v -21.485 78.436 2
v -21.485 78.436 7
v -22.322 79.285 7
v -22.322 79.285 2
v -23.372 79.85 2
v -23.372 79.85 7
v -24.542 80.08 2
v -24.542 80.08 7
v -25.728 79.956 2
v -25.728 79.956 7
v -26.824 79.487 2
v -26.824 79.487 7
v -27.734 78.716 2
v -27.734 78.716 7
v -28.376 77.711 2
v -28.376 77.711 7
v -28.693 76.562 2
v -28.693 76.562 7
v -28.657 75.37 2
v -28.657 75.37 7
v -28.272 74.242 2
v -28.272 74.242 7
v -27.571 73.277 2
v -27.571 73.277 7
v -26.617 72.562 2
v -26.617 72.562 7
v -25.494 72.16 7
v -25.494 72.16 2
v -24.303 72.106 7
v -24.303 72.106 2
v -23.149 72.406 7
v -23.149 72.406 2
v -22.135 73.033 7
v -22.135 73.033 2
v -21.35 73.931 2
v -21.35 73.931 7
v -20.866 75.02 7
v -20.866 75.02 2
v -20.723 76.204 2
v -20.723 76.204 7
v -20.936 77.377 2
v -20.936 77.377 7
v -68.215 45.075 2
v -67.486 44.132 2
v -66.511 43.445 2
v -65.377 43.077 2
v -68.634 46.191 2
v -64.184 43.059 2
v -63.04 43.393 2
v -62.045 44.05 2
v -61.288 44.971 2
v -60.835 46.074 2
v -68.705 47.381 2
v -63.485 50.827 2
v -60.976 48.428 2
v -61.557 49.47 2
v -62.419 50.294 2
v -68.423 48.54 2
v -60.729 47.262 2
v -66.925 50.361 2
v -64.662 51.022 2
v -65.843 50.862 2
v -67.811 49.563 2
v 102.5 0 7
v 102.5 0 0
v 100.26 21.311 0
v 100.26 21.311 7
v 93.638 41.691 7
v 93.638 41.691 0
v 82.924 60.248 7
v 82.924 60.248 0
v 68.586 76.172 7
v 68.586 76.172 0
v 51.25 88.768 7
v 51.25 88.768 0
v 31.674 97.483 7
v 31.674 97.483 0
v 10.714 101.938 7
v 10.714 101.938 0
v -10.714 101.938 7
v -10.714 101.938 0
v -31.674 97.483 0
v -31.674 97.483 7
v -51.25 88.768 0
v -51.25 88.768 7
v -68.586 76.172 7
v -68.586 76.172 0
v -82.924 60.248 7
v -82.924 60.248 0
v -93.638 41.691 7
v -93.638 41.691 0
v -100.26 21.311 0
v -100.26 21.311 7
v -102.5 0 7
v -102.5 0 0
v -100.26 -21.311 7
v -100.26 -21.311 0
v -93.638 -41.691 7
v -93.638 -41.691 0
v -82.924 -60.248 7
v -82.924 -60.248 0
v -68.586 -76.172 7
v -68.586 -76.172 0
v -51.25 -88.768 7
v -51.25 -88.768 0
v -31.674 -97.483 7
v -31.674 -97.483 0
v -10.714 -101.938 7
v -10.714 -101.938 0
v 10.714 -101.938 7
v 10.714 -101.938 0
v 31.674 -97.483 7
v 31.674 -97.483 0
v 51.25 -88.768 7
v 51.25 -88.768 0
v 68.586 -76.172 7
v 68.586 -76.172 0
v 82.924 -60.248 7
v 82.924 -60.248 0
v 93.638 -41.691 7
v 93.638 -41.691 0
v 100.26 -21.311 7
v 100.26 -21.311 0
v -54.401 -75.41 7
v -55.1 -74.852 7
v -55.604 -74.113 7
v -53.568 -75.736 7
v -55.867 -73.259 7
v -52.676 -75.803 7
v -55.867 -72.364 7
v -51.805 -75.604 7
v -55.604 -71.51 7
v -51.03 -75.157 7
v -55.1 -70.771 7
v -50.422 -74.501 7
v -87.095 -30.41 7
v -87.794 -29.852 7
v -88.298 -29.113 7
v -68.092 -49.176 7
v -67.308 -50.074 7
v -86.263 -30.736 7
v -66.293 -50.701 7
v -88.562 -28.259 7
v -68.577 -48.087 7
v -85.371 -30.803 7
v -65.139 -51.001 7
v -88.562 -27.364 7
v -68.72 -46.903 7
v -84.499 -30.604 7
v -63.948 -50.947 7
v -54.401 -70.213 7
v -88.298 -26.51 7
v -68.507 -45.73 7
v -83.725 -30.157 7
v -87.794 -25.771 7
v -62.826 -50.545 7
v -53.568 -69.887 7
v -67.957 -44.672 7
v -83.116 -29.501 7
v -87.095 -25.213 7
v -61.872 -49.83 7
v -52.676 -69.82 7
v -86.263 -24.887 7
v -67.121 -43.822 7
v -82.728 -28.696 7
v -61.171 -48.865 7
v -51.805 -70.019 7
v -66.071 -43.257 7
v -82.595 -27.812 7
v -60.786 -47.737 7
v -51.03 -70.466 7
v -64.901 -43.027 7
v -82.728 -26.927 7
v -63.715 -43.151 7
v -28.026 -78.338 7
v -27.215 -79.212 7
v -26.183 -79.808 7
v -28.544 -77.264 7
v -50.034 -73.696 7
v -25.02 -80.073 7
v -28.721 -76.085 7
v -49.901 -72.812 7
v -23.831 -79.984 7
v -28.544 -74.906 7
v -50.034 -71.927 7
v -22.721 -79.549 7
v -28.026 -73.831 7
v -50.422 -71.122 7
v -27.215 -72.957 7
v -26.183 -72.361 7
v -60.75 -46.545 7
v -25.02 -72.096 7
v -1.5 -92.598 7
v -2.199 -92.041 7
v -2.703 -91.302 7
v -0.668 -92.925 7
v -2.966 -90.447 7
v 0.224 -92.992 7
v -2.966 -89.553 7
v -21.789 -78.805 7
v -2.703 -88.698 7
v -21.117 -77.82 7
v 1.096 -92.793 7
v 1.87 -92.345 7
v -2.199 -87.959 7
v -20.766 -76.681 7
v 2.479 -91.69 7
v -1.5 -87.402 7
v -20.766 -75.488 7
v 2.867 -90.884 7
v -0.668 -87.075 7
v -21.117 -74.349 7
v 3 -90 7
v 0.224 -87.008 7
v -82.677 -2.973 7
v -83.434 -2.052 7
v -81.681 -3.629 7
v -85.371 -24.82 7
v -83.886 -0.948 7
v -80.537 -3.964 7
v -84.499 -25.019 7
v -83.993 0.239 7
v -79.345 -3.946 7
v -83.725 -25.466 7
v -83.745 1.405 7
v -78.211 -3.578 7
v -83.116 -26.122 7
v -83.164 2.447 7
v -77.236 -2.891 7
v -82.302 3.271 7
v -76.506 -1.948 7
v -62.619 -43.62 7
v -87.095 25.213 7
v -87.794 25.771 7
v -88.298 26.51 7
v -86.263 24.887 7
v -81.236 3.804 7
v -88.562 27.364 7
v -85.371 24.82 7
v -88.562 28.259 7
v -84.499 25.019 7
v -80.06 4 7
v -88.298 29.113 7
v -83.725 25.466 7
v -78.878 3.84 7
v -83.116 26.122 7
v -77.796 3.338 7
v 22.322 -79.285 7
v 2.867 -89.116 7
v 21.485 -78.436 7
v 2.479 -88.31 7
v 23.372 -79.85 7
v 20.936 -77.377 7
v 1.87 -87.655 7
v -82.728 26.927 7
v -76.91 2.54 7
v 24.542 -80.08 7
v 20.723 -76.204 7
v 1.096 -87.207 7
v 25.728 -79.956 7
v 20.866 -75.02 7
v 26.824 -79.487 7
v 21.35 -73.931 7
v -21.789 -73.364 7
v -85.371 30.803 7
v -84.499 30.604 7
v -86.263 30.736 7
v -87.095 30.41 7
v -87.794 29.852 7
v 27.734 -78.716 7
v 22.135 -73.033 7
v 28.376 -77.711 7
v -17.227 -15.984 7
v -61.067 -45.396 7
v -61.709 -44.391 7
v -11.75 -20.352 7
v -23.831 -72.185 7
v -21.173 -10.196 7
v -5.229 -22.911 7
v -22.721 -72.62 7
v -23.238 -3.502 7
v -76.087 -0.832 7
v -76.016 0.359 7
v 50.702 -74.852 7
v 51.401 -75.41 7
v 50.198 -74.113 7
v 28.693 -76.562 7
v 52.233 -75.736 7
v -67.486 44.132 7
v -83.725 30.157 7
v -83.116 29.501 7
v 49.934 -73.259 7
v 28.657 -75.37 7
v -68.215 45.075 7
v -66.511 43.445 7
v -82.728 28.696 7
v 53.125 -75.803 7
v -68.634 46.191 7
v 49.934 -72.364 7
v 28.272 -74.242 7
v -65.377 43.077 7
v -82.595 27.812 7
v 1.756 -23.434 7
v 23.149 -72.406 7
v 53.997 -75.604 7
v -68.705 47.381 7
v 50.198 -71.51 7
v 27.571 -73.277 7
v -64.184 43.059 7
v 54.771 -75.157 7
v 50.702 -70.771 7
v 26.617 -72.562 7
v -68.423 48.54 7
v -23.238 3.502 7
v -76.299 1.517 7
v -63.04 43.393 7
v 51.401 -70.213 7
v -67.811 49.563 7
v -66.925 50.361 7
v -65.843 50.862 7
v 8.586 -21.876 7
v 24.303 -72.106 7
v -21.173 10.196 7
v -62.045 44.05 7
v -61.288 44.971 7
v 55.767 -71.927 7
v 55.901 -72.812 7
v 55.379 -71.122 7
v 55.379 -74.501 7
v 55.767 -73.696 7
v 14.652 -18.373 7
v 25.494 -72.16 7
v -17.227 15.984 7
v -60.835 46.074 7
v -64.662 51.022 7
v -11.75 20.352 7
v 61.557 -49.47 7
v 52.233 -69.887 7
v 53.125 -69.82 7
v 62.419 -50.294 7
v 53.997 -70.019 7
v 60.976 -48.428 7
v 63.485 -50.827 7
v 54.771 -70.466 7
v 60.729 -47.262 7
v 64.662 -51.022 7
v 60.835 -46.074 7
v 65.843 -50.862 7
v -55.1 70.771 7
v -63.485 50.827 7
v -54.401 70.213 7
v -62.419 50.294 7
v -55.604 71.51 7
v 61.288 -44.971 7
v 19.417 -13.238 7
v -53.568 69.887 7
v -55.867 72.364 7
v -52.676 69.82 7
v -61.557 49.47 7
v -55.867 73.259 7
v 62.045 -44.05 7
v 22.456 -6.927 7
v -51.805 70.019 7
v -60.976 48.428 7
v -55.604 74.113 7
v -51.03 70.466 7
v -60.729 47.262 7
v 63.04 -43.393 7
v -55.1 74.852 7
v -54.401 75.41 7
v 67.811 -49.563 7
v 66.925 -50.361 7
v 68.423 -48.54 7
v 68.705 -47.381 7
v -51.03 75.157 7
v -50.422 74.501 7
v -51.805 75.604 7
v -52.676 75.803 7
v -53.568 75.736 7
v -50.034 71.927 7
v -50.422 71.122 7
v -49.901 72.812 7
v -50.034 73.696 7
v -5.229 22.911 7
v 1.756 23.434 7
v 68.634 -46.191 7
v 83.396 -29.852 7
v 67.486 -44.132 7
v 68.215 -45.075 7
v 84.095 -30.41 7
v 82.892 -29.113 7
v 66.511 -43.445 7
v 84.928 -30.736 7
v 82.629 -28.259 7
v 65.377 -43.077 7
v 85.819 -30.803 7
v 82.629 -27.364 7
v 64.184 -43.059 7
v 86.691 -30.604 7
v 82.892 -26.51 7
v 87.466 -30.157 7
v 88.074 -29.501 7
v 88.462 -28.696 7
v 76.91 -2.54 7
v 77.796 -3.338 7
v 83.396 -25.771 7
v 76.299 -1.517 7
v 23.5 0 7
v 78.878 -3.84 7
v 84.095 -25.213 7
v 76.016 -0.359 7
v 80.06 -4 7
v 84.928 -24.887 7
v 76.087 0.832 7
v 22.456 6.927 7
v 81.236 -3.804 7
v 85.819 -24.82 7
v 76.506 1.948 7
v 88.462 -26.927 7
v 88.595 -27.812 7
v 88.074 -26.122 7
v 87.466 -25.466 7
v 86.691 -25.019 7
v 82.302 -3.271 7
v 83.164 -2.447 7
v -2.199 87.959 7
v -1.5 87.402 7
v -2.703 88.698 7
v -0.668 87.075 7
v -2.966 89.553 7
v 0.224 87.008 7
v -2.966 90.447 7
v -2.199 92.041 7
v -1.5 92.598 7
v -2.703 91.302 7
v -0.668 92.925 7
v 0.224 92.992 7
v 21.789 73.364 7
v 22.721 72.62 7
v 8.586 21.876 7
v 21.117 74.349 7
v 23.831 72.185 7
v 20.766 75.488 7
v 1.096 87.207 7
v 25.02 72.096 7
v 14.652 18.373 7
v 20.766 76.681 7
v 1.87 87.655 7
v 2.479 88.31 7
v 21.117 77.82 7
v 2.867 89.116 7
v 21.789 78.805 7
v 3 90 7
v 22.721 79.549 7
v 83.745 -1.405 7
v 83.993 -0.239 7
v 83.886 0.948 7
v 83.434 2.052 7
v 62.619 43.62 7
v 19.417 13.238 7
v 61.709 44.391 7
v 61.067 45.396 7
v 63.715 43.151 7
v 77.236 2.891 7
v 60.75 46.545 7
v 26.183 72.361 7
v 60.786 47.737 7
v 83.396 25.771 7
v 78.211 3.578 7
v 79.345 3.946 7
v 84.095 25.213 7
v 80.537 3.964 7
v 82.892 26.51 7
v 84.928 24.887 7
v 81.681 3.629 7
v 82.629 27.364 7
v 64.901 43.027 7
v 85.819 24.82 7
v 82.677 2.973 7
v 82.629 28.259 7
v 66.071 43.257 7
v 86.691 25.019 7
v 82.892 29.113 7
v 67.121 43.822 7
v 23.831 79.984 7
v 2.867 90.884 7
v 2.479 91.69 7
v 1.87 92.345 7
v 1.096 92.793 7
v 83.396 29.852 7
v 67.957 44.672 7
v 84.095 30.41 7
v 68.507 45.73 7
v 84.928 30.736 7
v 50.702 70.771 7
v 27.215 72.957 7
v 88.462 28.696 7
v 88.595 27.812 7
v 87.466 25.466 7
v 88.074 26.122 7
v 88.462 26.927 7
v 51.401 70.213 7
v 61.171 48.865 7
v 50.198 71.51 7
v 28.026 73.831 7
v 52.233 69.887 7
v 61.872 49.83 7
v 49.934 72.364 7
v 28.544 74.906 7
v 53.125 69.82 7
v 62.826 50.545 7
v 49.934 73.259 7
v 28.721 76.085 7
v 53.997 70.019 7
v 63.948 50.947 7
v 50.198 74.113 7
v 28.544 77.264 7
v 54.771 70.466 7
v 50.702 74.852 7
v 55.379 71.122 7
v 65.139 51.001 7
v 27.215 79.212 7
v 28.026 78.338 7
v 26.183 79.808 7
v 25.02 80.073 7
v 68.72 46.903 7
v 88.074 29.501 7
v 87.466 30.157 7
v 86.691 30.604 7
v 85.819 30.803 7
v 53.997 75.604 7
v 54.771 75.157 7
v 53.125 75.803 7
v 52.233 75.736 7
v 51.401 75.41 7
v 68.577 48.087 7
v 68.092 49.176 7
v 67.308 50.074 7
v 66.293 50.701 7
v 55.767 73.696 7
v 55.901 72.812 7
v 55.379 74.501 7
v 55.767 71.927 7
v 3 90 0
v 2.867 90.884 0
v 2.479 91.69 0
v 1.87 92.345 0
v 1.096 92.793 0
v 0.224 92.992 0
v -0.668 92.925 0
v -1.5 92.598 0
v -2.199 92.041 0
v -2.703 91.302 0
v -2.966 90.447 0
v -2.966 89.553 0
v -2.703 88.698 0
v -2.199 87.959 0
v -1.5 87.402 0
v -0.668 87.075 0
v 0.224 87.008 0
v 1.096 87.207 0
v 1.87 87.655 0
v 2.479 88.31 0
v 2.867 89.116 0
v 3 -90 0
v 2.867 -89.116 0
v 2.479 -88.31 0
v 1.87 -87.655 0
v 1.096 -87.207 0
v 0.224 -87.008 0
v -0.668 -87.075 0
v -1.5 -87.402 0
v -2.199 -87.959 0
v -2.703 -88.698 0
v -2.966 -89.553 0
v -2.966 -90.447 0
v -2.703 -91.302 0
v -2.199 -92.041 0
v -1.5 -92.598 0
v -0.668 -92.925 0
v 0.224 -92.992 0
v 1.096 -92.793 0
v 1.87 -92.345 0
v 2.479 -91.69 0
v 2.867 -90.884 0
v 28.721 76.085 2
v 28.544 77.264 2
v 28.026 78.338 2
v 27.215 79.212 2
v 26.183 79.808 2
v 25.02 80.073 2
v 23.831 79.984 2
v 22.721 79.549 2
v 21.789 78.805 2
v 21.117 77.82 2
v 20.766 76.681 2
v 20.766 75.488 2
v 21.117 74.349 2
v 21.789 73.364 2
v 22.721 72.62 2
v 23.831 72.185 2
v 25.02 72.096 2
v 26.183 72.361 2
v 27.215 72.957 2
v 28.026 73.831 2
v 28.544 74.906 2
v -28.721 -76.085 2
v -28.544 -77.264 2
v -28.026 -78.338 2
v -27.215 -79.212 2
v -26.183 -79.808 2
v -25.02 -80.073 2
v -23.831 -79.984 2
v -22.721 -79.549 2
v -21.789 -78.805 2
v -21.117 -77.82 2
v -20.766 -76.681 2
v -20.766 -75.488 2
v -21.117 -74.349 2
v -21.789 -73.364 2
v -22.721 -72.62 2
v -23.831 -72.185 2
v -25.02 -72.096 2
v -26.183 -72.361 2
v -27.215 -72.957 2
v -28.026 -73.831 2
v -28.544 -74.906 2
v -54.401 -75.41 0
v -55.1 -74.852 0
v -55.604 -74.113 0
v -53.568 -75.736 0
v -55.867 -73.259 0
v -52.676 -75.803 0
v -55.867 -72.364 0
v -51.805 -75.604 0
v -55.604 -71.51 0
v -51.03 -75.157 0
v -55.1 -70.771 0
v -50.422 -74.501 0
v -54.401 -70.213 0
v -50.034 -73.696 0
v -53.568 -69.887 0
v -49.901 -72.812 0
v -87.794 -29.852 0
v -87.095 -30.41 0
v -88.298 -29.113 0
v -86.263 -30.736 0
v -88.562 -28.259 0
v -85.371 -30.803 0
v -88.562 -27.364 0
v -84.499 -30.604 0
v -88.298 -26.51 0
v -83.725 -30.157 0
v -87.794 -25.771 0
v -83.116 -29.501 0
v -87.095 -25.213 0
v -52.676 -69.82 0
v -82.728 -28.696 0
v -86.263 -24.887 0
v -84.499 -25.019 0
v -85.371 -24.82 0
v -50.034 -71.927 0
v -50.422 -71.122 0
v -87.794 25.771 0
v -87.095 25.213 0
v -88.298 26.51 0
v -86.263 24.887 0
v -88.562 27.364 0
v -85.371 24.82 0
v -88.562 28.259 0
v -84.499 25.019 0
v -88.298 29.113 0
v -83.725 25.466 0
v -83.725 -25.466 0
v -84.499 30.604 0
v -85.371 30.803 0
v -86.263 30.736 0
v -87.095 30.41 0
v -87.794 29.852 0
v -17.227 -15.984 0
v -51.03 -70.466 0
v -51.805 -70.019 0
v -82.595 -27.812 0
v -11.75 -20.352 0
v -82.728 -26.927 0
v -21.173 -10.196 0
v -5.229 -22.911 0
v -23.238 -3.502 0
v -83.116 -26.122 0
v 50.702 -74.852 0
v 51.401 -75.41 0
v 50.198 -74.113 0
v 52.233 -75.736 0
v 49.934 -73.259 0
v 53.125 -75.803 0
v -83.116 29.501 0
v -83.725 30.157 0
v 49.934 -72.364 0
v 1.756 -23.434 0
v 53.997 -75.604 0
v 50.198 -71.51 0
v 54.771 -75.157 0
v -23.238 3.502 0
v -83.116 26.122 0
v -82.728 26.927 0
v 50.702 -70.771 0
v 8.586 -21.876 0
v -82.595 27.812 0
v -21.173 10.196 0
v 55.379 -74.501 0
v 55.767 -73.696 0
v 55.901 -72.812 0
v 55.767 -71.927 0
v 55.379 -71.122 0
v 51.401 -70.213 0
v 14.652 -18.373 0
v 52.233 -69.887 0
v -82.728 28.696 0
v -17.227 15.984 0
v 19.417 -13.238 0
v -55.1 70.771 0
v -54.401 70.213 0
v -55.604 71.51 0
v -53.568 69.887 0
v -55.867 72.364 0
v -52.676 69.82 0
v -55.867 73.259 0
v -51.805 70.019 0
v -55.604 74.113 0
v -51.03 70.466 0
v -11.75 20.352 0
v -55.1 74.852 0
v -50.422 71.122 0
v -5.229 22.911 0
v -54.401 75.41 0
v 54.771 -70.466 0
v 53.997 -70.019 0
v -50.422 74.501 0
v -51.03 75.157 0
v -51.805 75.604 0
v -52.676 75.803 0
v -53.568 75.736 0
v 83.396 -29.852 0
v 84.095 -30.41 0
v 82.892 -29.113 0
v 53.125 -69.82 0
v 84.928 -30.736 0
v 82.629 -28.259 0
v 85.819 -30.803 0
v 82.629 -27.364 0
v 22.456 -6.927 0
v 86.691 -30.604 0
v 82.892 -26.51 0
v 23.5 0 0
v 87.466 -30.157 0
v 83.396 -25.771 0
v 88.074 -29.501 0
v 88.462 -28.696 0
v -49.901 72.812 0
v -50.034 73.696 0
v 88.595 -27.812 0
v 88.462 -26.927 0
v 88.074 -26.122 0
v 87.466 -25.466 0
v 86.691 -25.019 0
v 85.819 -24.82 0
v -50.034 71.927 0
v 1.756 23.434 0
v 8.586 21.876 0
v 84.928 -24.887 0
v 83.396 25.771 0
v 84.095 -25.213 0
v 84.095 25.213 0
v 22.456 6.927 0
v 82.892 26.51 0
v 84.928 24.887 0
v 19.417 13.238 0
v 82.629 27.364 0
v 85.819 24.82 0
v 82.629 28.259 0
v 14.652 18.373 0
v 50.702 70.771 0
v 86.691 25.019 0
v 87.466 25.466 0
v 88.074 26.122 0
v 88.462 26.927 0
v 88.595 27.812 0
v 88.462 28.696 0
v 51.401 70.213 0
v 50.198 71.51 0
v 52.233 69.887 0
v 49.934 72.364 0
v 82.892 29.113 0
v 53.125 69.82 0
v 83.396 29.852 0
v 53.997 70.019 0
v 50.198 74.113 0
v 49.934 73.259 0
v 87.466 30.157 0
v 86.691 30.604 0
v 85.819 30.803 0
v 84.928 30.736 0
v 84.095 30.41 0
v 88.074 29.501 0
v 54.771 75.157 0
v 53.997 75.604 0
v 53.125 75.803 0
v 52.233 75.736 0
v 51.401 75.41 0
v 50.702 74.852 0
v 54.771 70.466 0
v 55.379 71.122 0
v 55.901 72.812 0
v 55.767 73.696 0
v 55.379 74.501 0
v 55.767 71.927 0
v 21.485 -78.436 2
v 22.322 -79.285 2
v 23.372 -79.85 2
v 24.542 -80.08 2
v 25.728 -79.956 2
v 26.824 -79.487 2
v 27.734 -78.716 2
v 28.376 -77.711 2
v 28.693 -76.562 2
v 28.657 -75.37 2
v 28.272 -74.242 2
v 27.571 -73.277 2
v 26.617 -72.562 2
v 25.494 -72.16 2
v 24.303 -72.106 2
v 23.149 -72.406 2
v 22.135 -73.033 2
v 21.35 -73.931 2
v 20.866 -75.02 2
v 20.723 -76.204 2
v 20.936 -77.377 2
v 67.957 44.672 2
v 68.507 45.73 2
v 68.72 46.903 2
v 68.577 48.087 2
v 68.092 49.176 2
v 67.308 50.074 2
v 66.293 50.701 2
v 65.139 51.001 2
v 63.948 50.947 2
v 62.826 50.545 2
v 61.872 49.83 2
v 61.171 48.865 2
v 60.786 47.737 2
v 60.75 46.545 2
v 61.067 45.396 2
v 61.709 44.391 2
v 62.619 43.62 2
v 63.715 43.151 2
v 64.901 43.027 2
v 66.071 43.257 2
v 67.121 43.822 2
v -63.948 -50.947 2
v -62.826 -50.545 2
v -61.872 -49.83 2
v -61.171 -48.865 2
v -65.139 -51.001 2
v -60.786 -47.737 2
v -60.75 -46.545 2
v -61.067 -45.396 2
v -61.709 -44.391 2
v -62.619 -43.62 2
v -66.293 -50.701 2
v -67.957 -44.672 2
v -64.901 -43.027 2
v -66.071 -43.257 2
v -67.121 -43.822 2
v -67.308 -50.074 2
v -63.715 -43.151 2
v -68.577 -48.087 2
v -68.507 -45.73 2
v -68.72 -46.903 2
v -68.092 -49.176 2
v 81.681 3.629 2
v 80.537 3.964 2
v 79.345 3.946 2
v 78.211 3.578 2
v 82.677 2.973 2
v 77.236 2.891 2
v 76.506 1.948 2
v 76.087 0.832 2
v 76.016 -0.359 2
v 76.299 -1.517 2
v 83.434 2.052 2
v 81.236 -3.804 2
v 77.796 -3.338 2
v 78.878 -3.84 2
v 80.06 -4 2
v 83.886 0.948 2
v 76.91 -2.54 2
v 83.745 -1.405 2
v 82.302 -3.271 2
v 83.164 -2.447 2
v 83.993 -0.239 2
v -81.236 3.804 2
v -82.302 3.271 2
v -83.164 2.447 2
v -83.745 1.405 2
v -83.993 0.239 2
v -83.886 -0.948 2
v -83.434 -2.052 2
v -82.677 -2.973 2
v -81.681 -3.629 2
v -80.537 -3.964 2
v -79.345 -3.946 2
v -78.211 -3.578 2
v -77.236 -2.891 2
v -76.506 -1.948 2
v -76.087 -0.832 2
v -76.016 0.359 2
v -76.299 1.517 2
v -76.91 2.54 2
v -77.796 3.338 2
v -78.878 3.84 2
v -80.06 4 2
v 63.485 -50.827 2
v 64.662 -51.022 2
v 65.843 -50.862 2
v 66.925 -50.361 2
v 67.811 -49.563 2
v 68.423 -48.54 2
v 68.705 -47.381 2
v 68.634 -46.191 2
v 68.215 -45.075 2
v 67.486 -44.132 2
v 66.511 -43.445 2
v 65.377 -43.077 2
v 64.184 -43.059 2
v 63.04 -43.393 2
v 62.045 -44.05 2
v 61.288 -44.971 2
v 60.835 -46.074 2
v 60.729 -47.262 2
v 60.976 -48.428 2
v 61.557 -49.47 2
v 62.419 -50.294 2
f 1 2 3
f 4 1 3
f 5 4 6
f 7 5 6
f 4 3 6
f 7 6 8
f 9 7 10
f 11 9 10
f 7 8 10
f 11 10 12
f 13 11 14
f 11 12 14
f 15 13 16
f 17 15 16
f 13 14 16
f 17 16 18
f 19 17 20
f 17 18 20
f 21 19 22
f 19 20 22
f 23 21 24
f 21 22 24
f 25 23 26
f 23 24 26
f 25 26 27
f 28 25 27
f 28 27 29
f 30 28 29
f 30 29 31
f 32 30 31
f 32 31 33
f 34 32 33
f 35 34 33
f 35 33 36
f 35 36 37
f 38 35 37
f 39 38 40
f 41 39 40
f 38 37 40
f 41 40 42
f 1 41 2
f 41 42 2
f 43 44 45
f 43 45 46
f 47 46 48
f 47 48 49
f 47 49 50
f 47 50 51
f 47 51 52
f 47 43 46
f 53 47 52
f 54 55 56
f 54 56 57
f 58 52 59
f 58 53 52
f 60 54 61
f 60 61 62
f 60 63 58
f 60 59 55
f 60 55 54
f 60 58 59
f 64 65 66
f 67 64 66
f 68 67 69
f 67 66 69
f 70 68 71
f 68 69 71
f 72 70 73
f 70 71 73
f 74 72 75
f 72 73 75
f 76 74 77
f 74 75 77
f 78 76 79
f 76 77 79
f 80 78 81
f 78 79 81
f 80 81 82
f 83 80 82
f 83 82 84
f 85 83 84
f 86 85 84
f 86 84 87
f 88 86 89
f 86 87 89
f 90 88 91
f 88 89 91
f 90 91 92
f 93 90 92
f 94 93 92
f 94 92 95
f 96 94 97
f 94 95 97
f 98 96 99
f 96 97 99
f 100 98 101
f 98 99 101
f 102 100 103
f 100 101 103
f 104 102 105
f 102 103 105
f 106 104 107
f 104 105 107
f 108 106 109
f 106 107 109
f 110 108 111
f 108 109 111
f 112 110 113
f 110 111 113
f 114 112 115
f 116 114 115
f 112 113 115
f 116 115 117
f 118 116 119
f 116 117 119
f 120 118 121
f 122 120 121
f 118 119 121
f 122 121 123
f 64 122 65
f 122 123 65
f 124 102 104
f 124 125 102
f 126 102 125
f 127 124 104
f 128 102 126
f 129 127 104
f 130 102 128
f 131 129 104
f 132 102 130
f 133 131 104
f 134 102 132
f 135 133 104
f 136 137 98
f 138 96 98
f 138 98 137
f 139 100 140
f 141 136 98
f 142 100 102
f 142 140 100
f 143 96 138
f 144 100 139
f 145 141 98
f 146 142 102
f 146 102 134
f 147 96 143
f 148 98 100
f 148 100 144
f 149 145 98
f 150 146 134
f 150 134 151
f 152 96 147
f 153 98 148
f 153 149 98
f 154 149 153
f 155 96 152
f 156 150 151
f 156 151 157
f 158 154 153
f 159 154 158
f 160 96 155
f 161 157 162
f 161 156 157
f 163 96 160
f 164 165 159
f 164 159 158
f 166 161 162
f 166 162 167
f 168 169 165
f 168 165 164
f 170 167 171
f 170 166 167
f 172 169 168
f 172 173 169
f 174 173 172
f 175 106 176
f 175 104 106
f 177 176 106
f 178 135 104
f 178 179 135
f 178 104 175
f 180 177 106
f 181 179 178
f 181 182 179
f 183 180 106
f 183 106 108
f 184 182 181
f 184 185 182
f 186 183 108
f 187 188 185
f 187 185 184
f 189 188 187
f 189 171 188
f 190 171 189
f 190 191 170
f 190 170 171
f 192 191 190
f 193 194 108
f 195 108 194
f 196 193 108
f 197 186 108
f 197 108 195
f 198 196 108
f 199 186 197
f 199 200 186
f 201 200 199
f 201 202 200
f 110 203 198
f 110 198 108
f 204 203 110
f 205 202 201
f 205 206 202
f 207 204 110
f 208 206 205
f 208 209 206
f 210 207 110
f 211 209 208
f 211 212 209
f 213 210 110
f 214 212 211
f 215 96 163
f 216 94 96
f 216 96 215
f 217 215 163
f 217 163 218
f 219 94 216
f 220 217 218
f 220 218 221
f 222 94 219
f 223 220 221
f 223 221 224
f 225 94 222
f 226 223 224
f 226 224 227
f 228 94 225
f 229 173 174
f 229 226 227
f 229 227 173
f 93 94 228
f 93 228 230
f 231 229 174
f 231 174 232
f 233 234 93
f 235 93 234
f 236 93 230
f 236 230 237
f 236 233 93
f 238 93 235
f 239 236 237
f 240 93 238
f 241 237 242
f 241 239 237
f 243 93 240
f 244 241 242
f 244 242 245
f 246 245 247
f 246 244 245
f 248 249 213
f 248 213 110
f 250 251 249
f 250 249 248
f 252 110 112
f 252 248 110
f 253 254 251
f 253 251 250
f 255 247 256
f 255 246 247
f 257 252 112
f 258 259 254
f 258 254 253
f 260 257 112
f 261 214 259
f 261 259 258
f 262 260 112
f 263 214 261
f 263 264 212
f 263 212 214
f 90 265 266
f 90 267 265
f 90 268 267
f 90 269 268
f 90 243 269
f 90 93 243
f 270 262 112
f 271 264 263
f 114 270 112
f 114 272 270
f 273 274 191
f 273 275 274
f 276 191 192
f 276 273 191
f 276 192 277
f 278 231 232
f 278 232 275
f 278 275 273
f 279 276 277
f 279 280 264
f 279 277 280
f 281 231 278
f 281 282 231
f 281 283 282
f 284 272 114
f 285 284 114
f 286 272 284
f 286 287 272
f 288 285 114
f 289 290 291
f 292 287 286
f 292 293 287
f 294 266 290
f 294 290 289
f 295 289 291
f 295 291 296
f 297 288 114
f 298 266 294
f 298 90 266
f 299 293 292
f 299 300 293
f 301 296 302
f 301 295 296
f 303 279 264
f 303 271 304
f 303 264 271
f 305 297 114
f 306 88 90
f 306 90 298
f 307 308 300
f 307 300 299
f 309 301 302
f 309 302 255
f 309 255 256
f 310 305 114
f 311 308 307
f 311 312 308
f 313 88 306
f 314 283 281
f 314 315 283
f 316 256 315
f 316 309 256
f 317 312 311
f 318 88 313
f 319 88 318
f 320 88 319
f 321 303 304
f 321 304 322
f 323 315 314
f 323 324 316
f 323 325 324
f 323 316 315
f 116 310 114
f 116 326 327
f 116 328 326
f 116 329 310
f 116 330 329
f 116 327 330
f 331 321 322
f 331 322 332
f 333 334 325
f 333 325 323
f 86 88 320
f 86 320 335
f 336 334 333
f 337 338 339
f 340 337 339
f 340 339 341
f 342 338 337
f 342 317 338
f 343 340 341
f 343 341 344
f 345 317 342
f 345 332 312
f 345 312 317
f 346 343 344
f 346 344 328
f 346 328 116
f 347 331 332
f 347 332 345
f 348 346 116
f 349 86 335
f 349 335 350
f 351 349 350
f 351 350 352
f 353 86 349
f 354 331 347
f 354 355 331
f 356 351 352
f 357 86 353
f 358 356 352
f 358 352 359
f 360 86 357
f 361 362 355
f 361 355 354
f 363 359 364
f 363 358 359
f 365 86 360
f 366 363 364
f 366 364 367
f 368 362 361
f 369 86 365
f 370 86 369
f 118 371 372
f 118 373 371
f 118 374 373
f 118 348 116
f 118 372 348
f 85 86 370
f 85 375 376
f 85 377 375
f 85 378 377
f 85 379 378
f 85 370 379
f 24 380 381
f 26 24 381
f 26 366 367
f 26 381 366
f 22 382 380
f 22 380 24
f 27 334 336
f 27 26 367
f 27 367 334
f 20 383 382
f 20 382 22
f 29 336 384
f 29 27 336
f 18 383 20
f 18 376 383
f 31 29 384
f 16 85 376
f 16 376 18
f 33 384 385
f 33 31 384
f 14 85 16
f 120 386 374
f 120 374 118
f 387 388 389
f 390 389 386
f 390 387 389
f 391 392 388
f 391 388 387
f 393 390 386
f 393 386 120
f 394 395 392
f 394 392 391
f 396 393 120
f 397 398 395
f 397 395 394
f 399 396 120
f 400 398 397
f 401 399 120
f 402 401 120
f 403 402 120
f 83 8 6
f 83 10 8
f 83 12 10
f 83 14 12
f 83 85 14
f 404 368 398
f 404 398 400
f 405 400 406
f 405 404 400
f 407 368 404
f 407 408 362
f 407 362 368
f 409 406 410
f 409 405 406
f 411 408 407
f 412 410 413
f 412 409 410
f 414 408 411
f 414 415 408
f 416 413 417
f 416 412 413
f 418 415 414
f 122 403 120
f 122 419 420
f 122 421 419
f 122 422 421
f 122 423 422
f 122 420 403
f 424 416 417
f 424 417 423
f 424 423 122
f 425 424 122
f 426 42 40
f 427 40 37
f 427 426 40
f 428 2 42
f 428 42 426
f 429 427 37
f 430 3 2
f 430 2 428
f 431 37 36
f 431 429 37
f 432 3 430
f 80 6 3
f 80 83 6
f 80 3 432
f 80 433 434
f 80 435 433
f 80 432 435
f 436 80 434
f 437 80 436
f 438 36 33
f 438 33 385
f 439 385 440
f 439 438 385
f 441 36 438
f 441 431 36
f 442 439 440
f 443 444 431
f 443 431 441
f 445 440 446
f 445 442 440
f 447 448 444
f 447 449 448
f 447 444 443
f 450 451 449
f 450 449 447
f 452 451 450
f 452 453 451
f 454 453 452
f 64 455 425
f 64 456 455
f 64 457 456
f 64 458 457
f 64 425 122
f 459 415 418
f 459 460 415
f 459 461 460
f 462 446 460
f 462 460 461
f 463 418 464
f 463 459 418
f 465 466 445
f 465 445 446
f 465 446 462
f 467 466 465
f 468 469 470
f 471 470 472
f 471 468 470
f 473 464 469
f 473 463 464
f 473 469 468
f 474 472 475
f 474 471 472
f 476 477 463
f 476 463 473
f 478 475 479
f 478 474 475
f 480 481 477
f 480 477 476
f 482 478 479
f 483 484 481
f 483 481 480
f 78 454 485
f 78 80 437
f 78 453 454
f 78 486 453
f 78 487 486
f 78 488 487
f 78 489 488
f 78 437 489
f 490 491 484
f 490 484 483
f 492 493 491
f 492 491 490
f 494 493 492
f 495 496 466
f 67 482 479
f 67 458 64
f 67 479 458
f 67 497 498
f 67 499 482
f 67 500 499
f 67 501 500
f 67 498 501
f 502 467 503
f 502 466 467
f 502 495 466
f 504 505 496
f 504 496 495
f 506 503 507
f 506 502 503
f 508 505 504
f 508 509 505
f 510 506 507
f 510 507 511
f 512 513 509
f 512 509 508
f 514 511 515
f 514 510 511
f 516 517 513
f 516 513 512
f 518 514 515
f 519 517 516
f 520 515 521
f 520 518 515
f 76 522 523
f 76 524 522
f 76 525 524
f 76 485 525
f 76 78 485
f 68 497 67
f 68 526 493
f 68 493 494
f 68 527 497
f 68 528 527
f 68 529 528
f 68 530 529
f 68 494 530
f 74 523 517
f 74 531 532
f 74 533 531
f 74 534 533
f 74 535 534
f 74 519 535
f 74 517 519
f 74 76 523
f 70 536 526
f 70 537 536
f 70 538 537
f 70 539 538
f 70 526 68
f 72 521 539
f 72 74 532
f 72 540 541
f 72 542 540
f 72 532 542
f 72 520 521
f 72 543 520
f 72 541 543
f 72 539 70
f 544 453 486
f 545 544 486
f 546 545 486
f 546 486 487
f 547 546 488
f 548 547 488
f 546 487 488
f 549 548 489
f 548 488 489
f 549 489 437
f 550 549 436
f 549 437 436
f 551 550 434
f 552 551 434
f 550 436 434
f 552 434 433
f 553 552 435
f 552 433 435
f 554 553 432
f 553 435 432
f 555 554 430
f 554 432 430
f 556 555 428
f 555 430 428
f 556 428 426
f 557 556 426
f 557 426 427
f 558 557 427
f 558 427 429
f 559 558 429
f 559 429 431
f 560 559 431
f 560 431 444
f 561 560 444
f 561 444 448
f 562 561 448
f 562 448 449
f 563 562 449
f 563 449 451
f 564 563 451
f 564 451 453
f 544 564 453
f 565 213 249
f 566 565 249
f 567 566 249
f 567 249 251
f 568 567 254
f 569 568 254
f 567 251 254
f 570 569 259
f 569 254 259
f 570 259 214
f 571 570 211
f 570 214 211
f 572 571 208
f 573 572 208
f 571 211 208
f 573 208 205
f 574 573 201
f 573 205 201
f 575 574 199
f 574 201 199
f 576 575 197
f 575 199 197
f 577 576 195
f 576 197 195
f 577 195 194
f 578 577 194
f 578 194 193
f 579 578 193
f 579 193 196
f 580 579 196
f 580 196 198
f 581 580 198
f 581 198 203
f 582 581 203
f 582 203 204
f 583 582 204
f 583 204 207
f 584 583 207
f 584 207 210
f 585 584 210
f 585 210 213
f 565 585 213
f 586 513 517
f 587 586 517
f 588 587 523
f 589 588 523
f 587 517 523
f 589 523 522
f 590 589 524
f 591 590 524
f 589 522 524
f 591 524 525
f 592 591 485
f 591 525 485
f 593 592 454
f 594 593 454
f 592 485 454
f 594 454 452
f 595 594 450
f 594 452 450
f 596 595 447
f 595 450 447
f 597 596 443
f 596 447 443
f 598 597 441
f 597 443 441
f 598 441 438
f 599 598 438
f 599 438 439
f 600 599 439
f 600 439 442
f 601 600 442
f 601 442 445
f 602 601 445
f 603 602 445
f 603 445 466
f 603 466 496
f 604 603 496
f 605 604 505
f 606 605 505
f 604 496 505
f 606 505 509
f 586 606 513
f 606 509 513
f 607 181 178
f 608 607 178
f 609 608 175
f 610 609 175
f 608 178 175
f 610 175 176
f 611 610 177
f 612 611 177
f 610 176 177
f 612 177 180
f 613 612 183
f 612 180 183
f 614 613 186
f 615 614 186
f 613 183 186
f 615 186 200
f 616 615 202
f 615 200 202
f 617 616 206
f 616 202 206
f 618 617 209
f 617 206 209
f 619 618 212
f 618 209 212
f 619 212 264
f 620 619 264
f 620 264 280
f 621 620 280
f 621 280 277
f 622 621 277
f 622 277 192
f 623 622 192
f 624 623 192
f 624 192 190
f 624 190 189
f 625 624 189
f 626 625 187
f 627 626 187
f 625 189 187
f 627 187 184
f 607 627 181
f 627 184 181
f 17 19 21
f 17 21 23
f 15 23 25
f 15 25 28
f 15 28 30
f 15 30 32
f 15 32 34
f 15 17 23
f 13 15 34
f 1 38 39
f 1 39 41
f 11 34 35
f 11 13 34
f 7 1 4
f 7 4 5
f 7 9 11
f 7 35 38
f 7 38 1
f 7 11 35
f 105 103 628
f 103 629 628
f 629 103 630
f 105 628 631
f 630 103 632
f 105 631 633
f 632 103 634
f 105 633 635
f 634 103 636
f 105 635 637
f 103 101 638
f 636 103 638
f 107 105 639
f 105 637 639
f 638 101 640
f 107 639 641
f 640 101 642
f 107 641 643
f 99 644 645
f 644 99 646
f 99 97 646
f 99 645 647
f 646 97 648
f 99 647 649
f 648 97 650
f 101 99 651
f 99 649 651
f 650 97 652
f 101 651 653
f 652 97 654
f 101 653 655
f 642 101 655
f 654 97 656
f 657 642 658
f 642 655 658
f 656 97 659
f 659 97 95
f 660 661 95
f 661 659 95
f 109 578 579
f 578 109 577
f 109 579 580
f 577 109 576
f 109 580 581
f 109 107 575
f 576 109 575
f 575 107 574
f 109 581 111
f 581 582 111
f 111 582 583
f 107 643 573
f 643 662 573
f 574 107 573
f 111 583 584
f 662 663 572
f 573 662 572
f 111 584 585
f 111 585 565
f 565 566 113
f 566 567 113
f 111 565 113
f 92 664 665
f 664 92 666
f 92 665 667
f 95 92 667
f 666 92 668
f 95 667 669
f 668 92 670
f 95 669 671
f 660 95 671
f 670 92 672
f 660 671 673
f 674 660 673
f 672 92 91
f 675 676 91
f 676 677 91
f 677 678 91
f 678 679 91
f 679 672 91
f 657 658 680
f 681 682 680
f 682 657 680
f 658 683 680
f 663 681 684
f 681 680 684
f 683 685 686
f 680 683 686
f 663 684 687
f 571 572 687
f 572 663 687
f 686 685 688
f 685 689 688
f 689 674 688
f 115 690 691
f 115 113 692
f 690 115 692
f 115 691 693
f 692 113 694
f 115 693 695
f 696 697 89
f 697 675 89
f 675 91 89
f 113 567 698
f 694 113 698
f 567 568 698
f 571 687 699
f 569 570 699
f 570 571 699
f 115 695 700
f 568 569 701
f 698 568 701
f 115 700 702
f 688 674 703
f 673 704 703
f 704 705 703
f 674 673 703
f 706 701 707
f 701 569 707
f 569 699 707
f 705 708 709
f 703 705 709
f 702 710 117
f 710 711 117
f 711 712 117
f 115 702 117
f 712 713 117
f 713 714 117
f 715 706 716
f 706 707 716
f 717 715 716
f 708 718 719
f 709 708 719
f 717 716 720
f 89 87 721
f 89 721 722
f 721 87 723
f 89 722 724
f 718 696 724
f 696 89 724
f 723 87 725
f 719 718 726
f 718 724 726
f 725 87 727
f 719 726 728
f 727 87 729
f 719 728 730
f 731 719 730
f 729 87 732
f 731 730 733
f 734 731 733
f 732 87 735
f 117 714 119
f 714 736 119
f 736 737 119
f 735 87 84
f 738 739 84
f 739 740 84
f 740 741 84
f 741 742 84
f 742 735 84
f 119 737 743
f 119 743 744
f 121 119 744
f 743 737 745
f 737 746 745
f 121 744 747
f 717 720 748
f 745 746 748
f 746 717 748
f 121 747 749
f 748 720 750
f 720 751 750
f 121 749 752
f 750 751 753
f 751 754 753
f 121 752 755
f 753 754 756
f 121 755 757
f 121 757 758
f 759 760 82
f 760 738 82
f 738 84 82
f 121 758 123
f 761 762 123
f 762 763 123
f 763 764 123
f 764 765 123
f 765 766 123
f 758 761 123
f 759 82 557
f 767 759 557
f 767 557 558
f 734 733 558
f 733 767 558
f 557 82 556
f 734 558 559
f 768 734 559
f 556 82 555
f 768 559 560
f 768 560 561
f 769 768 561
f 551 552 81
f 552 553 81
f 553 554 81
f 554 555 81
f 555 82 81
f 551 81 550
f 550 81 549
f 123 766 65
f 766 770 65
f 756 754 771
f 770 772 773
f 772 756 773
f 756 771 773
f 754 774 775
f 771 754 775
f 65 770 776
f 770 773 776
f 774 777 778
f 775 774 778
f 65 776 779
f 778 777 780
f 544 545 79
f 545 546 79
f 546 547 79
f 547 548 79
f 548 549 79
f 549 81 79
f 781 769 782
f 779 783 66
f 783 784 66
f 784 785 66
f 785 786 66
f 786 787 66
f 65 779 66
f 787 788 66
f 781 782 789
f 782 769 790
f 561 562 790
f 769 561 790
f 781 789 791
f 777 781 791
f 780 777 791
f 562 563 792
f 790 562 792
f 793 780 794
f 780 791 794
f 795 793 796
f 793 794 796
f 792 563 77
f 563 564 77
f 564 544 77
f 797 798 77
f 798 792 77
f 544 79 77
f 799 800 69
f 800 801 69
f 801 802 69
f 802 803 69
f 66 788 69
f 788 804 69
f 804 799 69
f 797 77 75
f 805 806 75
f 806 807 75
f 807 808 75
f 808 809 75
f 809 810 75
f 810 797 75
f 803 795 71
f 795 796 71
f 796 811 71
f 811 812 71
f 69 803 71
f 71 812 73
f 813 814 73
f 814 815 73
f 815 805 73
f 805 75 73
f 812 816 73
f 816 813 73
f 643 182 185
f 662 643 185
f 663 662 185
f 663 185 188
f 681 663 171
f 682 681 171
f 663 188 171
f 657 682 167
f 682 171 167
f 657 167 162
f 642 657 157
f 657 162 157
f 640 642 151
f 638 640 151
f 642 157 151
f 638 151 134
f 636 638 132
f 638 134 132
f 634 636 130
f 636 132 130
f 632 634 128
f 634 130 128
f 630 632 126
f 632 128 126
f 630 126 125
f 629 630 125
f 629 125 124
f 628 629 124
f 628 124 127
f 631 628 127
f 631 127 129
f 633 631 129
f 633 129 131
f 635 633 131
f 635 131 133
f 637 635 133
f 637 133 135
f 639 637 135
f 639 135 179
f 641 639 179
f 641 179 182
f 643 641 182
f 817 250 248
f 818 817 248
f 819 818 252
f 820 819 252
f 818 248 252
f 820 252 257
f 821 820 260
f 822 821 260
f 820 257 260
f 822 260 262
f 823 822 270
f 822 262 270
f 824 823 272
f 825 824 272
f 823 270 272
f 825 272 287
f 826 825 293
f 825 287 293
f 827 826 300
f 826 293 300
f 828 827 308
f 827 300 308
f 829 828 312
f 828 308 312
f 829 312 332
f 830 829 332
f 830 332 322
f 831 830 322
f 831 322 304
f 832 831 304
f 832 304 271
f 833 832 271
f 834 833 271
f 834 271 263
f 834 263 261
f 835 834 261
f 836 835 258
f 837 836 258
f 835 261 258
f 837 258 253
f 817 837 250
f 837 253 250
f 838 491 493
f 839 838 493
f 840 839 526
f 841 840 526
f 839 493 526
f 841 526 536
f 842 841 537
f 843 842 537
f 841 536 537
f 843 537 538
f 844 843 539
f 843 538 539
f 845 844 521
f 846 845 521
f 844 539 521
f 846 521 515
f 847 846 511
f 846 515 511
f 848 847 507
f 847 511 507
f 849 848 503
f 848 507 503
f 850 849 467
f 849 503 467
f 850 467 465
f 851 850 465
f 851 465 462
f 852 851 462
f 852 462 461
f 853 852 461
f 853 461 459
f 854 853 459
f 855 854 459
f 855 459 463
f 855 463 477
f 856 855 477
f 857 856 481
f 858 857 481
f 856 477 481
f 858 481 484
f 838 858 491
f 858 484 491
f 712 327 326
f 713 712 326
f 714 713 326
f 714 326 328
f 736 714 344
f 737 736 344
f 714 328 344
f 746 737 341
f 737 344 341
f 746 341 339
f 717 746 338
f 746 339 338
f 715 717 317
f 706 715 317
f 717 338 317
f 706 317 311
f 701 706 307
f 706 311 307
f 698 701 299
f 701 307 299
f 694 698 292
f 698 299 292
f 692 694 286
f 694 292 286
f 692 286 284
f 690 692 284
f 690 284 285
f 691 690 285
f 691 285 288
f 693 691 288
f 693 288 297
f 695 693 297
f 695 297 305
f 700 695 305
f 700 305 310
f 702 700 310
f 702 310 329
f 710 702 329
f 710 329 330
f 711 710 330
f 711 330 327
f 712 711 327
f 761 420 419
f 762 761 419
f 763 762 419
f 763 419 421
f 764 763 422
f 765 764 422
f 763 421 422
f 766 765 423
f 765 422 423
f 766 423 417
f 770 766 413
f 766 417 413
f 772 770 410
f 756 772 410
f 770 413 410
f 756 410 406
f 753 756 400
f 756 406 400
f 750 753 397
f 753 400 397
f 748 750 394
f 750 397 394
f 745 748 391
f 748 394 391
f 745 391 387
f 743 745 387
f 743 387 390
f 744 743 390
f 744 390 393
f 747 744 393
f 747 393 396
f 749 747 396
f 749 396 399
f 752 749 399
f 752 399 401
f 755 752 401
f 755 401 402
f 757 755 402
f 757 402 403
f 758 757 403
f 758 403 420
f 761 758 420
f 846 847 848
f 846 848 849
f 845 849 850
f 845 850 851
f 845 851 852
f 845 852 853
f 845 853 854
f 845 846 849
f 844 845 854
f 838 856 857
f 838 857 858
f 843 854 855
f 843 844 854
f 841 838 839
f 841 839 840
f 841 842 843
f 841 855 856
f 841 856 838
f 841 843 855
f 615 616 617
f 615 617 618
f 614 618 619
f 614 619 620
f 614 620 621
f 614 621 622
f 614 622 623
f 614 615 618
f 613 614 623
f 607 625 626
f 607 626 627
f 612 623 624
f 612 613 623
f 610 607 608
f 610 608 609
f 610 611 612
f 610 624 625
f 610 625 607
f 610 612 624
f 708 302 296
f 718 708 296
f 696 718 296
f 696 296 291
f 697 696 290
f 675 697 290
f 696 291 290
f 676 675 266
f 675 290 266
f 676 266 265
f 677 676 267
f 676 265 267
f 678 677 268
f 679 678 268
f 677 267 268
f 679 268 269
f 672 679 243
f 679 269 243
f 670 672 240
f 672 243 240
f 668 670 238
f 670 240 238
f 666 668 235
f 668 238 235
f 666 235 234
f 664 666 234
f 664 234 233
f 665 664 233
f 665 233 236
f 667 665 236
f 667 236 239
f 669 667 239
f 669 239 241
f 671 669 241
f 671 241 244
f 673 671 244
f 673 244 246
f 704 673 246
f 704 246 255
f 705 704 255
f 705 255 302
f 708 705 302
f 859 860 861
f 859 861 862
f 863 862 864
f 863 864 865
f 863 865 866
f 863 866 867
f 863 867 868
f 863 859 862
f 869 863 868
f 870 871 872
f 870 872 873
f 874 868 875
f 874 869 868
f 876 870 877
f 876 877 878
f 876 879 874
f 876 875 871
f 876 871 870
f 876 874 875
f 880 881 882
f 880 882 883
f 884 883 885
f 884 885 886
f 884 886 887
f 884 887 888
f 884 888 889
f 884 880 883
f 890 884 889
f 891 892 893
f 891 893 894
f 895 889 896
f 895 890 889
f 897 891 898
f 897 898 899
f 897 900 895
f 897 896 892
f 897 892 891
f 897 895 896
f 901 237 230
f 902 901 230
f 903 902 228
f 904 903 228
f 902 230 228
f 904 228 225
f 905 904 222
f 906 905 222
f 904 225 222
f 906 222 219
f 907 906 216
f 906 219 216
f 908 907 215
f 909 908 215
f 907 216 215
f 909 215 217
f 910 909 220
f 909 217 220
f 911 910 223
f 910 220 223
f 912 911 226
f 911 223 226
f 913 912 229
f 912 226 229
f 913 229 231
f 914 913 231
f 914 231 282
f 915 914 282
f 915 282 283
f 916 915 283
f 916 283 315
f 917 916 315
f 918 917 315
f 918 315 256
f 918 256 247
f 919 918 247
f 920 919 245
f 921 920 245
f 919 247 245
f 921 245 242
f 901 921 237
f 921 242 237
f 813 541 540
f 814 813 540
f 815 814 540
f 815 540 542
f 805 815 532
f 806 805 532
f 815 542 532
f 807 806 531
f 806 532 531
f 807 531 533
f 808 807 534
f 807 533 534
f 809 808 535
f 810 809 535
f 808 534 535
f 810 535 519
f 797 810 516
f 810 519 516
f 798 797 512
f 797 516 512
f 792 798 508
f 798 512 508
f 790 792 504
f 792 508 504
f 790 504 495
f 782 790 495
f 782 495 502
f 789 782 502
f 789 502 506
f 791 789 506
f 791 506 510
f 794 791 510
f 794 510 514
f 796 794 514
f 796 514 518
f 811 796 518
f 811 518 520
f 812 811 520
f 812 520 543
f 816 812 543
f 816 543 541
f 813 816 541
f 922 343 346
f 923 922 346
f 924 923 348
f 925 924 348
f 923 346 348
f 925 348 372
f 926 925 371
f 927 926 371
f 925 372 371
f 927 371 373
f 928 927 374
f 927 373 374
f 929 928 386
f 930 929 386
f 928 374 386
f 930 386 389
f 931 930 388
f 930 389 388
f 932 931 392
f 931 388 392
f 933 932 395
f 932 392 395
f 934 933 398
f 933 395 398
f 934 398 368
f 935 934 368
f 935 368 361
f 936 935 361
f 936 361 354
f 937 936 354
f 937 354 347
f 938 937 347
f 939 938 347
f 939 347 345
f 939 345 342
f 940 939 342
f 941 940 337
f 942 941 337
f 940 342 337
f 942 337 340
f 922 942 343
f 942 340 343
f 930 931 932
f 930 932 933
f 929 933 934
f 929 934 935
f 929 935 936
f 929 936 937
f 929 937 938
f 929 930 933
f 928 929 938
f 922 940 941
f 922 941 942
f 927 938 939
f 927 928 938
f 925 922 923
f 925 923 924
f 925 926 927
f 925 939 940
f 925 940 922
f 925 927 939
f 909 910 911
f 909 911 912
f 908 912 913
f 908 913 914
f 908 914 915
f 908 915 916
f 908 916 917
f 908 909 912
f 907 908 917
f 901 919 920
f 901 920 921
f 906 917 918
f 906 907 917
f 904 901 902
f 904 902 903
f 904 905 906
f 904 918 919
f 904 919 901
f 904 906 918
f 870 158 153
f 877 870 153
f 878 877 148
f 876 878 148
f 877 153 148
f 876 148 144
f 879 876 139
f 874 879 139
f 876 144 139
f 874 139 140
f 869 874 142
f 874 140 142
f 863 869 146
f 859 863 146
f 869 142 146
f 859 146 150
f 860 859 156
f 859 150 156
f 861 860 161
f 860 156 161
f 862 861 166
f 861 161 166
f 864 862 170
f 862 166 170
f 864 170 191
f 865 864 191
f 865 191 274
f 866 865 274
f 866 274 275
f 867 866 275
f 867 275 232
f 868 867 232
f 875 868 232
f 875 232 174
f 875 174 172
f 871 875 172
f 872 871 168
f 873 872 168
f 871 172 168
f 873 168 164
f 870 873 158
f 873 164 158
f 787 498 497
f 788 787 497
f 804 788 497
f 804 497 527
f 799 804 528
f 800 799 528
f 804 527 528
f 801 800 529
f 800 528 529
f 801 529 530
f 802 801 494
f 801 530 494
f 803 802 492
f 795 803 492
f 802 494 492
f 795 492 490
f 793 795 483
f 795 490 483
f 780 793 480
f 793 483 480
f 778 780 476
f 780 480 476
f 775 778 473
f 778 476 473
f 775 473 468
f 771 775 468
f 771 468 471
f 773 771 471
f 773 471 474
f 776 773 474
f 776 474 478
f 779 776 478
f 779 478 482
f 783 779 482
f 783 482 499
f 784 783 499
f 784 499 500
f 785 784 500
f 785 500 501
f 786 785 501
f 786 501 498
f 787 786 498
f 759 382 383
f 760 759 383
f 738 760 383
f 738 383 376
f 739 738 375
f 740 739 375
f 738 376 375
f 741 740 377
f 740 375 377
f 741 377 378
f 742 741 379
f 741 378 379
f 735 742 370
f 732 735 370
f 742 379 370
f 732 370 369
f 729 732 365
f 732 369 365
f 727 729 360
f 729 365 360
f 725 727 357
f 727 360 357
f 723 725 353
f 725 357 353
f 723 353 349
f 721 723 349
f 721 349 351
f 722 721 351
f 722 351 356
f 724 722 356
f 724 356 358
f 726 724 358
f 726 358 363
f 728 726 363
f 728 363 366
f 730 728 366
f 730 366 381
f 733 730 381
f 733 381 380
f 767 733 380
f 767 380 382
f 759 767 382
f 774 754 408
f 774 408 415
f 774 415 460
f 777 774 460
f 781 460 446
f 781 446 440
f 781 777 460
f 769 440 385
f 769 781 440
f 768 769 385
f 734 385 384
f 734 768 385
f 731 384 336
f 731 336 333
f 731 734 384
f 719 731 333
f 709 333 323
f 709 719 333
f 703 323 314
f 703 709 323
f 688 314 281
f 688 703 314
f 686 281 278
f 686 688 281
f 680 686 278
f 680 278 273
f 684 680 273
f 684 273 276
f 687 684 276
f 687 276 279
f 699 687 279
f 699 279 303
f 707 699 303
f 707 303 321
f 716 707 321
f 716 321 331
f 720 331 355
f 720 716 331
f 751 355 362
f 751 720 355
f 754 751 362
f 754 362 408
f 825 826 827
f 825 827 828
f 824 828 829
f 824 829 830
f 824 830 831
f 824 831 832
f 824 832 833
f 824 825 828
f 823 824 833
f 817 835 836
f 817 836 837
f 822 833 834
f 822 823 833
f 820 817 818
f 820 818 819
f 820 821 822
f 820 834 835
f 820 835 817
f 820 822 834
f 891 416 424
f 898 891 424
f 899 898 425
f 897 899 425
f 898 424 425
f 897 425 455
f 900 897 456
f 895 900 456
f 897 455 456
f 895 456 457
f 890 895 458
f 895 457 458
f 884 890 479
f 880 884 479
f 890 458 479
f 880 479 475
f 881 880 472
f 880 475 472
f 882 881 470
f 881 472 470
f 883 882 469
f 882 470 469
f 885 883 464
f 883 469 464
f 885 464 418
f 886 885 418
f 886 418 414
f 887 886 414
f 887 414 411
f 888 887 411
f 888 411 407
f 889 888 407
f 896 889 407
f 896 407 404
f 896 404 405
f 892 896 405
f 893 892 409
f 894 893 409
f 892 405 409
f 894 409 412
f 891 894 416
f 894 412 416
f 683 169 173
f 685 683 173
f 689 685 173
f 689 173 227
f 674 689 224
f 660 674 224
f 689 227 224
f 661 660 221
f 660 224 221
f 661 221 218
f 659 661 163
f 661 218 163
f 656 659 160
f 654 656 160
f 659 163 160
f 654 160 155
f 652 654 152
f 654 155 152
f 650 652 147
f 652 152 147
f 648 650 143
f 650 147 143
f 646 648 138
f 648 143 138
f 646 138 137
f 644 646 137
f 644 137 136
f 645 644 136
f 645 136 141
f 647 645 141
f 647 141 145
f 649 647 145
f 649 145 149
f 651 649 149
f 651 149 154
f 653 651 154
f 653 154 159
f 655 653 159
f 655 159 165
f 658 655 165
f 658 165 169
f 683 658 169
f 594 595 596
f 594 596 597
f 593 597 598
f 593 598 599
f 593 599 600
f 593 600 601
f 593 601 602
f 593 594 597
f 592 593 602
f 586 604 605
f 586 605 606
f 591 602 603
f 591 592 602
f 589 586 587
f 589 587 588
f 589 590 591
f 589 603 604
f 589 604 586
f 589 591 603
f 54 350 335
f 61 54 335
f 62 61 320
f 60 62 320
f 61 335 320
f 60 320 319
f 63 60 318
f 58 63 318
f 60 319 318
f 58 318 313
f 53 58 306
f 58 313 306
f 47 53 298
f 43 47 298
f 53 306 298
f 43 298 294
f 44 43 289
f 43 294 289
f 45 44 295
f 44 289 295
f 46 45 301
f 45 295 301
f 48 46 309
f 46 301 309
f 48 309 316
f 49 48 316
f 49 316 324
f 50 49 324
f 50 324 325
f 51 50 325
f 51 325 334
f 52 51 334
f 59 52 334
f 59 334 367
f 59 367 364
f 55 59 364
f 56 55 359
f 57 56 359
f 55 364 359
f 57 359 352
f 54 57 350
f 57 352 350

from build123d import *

# Parameters (mm, degrees)
SKETCH1_R           = 102.5
SKETCH1_R_2         = 23.5
BOSS_EXTRUDE1_DEPTH = 7
SKETCH2_R           = 3
CUT_EXTRUDE1_DEPTH  = 146.125807491
SKETCH3_R           = 4
CUT_EXTRUDE2_DEPTH  = 5
CIRPATTERN1_COUNT   = 10


with BuildPart() as part:
    # Sketch1 → Boss-Extrude1 (new body)
    with BuildSketch(Plane.XY):
        Circle(SKETCH1_R)
        Circle(SKETCH1_R_2, mode=Mode.SUBTRACT)
    extrude(amount=BOSS_EXTRUDE1_DEPTH)

    # Sketch2 → Cut-Extrude1 (cut, through all)
    with BuildSketch(Plane.XY.offset(7)):
        with Locations((0, 90)):
            Circle(SKETCH2_R)
        with Locations((52.900672706, 72.811529494)):
            Circle(SKETCH2_R)
        with Locations((85.595086467, 27.811529494)):
            Circle(SKETCH2_R)
        with Locations((85.595086467, -27.811529494)):
            Circle(SKETCH2_R)
        with Locations((52.900672706, -72.811529494)):
            Circle(SKETCH2_R)
        with Locations((0, -90)):
            Circle(SKETCH2_R)
        with Locations((-52.900672706, -72.811529494)):
            Circle(SKETCH2_R)
        with Locations((-85.595086467, -27.811529494)):
            Circle(SKETCH2_R)
        with Locations((-85.595086467, 27.811529494)):
            Circle(SKETCH2_R)
        with Locations((-52.900672706, 72.811529494)):
            Circle(SKETCH2_R)
    extrude(amount=-CUT_EXTRUDE1_DEPTH, mode=Mode.SUBTRACT)

    # Sketch3 → Cut-Extrude2 (cut)
    with BuildSketch(Plane.XY.offset(7)):
        with Locations((24.72135955, 76.084521304)):
            Circle(SKETCH3_R)
    cut_extrude2 = extrude(amount=-CUT_EXTRUDE2_DEPTH, mode=Mode.SUBTRACT)

    # CirPattern1: Cut-Extrude2 ×10 about axis
    cirpattern1_axis = Axis((0, 0, 0), (0, 0, 1))
    for i in range(1, CIRPATTERN1_COUNT):
        add(cut_extrude2.rotate(cirpattern1_axis, i * 360 / CIRPATTERN1_COUNT), mode=Mode.SUBTRACT)


solid = part.part
